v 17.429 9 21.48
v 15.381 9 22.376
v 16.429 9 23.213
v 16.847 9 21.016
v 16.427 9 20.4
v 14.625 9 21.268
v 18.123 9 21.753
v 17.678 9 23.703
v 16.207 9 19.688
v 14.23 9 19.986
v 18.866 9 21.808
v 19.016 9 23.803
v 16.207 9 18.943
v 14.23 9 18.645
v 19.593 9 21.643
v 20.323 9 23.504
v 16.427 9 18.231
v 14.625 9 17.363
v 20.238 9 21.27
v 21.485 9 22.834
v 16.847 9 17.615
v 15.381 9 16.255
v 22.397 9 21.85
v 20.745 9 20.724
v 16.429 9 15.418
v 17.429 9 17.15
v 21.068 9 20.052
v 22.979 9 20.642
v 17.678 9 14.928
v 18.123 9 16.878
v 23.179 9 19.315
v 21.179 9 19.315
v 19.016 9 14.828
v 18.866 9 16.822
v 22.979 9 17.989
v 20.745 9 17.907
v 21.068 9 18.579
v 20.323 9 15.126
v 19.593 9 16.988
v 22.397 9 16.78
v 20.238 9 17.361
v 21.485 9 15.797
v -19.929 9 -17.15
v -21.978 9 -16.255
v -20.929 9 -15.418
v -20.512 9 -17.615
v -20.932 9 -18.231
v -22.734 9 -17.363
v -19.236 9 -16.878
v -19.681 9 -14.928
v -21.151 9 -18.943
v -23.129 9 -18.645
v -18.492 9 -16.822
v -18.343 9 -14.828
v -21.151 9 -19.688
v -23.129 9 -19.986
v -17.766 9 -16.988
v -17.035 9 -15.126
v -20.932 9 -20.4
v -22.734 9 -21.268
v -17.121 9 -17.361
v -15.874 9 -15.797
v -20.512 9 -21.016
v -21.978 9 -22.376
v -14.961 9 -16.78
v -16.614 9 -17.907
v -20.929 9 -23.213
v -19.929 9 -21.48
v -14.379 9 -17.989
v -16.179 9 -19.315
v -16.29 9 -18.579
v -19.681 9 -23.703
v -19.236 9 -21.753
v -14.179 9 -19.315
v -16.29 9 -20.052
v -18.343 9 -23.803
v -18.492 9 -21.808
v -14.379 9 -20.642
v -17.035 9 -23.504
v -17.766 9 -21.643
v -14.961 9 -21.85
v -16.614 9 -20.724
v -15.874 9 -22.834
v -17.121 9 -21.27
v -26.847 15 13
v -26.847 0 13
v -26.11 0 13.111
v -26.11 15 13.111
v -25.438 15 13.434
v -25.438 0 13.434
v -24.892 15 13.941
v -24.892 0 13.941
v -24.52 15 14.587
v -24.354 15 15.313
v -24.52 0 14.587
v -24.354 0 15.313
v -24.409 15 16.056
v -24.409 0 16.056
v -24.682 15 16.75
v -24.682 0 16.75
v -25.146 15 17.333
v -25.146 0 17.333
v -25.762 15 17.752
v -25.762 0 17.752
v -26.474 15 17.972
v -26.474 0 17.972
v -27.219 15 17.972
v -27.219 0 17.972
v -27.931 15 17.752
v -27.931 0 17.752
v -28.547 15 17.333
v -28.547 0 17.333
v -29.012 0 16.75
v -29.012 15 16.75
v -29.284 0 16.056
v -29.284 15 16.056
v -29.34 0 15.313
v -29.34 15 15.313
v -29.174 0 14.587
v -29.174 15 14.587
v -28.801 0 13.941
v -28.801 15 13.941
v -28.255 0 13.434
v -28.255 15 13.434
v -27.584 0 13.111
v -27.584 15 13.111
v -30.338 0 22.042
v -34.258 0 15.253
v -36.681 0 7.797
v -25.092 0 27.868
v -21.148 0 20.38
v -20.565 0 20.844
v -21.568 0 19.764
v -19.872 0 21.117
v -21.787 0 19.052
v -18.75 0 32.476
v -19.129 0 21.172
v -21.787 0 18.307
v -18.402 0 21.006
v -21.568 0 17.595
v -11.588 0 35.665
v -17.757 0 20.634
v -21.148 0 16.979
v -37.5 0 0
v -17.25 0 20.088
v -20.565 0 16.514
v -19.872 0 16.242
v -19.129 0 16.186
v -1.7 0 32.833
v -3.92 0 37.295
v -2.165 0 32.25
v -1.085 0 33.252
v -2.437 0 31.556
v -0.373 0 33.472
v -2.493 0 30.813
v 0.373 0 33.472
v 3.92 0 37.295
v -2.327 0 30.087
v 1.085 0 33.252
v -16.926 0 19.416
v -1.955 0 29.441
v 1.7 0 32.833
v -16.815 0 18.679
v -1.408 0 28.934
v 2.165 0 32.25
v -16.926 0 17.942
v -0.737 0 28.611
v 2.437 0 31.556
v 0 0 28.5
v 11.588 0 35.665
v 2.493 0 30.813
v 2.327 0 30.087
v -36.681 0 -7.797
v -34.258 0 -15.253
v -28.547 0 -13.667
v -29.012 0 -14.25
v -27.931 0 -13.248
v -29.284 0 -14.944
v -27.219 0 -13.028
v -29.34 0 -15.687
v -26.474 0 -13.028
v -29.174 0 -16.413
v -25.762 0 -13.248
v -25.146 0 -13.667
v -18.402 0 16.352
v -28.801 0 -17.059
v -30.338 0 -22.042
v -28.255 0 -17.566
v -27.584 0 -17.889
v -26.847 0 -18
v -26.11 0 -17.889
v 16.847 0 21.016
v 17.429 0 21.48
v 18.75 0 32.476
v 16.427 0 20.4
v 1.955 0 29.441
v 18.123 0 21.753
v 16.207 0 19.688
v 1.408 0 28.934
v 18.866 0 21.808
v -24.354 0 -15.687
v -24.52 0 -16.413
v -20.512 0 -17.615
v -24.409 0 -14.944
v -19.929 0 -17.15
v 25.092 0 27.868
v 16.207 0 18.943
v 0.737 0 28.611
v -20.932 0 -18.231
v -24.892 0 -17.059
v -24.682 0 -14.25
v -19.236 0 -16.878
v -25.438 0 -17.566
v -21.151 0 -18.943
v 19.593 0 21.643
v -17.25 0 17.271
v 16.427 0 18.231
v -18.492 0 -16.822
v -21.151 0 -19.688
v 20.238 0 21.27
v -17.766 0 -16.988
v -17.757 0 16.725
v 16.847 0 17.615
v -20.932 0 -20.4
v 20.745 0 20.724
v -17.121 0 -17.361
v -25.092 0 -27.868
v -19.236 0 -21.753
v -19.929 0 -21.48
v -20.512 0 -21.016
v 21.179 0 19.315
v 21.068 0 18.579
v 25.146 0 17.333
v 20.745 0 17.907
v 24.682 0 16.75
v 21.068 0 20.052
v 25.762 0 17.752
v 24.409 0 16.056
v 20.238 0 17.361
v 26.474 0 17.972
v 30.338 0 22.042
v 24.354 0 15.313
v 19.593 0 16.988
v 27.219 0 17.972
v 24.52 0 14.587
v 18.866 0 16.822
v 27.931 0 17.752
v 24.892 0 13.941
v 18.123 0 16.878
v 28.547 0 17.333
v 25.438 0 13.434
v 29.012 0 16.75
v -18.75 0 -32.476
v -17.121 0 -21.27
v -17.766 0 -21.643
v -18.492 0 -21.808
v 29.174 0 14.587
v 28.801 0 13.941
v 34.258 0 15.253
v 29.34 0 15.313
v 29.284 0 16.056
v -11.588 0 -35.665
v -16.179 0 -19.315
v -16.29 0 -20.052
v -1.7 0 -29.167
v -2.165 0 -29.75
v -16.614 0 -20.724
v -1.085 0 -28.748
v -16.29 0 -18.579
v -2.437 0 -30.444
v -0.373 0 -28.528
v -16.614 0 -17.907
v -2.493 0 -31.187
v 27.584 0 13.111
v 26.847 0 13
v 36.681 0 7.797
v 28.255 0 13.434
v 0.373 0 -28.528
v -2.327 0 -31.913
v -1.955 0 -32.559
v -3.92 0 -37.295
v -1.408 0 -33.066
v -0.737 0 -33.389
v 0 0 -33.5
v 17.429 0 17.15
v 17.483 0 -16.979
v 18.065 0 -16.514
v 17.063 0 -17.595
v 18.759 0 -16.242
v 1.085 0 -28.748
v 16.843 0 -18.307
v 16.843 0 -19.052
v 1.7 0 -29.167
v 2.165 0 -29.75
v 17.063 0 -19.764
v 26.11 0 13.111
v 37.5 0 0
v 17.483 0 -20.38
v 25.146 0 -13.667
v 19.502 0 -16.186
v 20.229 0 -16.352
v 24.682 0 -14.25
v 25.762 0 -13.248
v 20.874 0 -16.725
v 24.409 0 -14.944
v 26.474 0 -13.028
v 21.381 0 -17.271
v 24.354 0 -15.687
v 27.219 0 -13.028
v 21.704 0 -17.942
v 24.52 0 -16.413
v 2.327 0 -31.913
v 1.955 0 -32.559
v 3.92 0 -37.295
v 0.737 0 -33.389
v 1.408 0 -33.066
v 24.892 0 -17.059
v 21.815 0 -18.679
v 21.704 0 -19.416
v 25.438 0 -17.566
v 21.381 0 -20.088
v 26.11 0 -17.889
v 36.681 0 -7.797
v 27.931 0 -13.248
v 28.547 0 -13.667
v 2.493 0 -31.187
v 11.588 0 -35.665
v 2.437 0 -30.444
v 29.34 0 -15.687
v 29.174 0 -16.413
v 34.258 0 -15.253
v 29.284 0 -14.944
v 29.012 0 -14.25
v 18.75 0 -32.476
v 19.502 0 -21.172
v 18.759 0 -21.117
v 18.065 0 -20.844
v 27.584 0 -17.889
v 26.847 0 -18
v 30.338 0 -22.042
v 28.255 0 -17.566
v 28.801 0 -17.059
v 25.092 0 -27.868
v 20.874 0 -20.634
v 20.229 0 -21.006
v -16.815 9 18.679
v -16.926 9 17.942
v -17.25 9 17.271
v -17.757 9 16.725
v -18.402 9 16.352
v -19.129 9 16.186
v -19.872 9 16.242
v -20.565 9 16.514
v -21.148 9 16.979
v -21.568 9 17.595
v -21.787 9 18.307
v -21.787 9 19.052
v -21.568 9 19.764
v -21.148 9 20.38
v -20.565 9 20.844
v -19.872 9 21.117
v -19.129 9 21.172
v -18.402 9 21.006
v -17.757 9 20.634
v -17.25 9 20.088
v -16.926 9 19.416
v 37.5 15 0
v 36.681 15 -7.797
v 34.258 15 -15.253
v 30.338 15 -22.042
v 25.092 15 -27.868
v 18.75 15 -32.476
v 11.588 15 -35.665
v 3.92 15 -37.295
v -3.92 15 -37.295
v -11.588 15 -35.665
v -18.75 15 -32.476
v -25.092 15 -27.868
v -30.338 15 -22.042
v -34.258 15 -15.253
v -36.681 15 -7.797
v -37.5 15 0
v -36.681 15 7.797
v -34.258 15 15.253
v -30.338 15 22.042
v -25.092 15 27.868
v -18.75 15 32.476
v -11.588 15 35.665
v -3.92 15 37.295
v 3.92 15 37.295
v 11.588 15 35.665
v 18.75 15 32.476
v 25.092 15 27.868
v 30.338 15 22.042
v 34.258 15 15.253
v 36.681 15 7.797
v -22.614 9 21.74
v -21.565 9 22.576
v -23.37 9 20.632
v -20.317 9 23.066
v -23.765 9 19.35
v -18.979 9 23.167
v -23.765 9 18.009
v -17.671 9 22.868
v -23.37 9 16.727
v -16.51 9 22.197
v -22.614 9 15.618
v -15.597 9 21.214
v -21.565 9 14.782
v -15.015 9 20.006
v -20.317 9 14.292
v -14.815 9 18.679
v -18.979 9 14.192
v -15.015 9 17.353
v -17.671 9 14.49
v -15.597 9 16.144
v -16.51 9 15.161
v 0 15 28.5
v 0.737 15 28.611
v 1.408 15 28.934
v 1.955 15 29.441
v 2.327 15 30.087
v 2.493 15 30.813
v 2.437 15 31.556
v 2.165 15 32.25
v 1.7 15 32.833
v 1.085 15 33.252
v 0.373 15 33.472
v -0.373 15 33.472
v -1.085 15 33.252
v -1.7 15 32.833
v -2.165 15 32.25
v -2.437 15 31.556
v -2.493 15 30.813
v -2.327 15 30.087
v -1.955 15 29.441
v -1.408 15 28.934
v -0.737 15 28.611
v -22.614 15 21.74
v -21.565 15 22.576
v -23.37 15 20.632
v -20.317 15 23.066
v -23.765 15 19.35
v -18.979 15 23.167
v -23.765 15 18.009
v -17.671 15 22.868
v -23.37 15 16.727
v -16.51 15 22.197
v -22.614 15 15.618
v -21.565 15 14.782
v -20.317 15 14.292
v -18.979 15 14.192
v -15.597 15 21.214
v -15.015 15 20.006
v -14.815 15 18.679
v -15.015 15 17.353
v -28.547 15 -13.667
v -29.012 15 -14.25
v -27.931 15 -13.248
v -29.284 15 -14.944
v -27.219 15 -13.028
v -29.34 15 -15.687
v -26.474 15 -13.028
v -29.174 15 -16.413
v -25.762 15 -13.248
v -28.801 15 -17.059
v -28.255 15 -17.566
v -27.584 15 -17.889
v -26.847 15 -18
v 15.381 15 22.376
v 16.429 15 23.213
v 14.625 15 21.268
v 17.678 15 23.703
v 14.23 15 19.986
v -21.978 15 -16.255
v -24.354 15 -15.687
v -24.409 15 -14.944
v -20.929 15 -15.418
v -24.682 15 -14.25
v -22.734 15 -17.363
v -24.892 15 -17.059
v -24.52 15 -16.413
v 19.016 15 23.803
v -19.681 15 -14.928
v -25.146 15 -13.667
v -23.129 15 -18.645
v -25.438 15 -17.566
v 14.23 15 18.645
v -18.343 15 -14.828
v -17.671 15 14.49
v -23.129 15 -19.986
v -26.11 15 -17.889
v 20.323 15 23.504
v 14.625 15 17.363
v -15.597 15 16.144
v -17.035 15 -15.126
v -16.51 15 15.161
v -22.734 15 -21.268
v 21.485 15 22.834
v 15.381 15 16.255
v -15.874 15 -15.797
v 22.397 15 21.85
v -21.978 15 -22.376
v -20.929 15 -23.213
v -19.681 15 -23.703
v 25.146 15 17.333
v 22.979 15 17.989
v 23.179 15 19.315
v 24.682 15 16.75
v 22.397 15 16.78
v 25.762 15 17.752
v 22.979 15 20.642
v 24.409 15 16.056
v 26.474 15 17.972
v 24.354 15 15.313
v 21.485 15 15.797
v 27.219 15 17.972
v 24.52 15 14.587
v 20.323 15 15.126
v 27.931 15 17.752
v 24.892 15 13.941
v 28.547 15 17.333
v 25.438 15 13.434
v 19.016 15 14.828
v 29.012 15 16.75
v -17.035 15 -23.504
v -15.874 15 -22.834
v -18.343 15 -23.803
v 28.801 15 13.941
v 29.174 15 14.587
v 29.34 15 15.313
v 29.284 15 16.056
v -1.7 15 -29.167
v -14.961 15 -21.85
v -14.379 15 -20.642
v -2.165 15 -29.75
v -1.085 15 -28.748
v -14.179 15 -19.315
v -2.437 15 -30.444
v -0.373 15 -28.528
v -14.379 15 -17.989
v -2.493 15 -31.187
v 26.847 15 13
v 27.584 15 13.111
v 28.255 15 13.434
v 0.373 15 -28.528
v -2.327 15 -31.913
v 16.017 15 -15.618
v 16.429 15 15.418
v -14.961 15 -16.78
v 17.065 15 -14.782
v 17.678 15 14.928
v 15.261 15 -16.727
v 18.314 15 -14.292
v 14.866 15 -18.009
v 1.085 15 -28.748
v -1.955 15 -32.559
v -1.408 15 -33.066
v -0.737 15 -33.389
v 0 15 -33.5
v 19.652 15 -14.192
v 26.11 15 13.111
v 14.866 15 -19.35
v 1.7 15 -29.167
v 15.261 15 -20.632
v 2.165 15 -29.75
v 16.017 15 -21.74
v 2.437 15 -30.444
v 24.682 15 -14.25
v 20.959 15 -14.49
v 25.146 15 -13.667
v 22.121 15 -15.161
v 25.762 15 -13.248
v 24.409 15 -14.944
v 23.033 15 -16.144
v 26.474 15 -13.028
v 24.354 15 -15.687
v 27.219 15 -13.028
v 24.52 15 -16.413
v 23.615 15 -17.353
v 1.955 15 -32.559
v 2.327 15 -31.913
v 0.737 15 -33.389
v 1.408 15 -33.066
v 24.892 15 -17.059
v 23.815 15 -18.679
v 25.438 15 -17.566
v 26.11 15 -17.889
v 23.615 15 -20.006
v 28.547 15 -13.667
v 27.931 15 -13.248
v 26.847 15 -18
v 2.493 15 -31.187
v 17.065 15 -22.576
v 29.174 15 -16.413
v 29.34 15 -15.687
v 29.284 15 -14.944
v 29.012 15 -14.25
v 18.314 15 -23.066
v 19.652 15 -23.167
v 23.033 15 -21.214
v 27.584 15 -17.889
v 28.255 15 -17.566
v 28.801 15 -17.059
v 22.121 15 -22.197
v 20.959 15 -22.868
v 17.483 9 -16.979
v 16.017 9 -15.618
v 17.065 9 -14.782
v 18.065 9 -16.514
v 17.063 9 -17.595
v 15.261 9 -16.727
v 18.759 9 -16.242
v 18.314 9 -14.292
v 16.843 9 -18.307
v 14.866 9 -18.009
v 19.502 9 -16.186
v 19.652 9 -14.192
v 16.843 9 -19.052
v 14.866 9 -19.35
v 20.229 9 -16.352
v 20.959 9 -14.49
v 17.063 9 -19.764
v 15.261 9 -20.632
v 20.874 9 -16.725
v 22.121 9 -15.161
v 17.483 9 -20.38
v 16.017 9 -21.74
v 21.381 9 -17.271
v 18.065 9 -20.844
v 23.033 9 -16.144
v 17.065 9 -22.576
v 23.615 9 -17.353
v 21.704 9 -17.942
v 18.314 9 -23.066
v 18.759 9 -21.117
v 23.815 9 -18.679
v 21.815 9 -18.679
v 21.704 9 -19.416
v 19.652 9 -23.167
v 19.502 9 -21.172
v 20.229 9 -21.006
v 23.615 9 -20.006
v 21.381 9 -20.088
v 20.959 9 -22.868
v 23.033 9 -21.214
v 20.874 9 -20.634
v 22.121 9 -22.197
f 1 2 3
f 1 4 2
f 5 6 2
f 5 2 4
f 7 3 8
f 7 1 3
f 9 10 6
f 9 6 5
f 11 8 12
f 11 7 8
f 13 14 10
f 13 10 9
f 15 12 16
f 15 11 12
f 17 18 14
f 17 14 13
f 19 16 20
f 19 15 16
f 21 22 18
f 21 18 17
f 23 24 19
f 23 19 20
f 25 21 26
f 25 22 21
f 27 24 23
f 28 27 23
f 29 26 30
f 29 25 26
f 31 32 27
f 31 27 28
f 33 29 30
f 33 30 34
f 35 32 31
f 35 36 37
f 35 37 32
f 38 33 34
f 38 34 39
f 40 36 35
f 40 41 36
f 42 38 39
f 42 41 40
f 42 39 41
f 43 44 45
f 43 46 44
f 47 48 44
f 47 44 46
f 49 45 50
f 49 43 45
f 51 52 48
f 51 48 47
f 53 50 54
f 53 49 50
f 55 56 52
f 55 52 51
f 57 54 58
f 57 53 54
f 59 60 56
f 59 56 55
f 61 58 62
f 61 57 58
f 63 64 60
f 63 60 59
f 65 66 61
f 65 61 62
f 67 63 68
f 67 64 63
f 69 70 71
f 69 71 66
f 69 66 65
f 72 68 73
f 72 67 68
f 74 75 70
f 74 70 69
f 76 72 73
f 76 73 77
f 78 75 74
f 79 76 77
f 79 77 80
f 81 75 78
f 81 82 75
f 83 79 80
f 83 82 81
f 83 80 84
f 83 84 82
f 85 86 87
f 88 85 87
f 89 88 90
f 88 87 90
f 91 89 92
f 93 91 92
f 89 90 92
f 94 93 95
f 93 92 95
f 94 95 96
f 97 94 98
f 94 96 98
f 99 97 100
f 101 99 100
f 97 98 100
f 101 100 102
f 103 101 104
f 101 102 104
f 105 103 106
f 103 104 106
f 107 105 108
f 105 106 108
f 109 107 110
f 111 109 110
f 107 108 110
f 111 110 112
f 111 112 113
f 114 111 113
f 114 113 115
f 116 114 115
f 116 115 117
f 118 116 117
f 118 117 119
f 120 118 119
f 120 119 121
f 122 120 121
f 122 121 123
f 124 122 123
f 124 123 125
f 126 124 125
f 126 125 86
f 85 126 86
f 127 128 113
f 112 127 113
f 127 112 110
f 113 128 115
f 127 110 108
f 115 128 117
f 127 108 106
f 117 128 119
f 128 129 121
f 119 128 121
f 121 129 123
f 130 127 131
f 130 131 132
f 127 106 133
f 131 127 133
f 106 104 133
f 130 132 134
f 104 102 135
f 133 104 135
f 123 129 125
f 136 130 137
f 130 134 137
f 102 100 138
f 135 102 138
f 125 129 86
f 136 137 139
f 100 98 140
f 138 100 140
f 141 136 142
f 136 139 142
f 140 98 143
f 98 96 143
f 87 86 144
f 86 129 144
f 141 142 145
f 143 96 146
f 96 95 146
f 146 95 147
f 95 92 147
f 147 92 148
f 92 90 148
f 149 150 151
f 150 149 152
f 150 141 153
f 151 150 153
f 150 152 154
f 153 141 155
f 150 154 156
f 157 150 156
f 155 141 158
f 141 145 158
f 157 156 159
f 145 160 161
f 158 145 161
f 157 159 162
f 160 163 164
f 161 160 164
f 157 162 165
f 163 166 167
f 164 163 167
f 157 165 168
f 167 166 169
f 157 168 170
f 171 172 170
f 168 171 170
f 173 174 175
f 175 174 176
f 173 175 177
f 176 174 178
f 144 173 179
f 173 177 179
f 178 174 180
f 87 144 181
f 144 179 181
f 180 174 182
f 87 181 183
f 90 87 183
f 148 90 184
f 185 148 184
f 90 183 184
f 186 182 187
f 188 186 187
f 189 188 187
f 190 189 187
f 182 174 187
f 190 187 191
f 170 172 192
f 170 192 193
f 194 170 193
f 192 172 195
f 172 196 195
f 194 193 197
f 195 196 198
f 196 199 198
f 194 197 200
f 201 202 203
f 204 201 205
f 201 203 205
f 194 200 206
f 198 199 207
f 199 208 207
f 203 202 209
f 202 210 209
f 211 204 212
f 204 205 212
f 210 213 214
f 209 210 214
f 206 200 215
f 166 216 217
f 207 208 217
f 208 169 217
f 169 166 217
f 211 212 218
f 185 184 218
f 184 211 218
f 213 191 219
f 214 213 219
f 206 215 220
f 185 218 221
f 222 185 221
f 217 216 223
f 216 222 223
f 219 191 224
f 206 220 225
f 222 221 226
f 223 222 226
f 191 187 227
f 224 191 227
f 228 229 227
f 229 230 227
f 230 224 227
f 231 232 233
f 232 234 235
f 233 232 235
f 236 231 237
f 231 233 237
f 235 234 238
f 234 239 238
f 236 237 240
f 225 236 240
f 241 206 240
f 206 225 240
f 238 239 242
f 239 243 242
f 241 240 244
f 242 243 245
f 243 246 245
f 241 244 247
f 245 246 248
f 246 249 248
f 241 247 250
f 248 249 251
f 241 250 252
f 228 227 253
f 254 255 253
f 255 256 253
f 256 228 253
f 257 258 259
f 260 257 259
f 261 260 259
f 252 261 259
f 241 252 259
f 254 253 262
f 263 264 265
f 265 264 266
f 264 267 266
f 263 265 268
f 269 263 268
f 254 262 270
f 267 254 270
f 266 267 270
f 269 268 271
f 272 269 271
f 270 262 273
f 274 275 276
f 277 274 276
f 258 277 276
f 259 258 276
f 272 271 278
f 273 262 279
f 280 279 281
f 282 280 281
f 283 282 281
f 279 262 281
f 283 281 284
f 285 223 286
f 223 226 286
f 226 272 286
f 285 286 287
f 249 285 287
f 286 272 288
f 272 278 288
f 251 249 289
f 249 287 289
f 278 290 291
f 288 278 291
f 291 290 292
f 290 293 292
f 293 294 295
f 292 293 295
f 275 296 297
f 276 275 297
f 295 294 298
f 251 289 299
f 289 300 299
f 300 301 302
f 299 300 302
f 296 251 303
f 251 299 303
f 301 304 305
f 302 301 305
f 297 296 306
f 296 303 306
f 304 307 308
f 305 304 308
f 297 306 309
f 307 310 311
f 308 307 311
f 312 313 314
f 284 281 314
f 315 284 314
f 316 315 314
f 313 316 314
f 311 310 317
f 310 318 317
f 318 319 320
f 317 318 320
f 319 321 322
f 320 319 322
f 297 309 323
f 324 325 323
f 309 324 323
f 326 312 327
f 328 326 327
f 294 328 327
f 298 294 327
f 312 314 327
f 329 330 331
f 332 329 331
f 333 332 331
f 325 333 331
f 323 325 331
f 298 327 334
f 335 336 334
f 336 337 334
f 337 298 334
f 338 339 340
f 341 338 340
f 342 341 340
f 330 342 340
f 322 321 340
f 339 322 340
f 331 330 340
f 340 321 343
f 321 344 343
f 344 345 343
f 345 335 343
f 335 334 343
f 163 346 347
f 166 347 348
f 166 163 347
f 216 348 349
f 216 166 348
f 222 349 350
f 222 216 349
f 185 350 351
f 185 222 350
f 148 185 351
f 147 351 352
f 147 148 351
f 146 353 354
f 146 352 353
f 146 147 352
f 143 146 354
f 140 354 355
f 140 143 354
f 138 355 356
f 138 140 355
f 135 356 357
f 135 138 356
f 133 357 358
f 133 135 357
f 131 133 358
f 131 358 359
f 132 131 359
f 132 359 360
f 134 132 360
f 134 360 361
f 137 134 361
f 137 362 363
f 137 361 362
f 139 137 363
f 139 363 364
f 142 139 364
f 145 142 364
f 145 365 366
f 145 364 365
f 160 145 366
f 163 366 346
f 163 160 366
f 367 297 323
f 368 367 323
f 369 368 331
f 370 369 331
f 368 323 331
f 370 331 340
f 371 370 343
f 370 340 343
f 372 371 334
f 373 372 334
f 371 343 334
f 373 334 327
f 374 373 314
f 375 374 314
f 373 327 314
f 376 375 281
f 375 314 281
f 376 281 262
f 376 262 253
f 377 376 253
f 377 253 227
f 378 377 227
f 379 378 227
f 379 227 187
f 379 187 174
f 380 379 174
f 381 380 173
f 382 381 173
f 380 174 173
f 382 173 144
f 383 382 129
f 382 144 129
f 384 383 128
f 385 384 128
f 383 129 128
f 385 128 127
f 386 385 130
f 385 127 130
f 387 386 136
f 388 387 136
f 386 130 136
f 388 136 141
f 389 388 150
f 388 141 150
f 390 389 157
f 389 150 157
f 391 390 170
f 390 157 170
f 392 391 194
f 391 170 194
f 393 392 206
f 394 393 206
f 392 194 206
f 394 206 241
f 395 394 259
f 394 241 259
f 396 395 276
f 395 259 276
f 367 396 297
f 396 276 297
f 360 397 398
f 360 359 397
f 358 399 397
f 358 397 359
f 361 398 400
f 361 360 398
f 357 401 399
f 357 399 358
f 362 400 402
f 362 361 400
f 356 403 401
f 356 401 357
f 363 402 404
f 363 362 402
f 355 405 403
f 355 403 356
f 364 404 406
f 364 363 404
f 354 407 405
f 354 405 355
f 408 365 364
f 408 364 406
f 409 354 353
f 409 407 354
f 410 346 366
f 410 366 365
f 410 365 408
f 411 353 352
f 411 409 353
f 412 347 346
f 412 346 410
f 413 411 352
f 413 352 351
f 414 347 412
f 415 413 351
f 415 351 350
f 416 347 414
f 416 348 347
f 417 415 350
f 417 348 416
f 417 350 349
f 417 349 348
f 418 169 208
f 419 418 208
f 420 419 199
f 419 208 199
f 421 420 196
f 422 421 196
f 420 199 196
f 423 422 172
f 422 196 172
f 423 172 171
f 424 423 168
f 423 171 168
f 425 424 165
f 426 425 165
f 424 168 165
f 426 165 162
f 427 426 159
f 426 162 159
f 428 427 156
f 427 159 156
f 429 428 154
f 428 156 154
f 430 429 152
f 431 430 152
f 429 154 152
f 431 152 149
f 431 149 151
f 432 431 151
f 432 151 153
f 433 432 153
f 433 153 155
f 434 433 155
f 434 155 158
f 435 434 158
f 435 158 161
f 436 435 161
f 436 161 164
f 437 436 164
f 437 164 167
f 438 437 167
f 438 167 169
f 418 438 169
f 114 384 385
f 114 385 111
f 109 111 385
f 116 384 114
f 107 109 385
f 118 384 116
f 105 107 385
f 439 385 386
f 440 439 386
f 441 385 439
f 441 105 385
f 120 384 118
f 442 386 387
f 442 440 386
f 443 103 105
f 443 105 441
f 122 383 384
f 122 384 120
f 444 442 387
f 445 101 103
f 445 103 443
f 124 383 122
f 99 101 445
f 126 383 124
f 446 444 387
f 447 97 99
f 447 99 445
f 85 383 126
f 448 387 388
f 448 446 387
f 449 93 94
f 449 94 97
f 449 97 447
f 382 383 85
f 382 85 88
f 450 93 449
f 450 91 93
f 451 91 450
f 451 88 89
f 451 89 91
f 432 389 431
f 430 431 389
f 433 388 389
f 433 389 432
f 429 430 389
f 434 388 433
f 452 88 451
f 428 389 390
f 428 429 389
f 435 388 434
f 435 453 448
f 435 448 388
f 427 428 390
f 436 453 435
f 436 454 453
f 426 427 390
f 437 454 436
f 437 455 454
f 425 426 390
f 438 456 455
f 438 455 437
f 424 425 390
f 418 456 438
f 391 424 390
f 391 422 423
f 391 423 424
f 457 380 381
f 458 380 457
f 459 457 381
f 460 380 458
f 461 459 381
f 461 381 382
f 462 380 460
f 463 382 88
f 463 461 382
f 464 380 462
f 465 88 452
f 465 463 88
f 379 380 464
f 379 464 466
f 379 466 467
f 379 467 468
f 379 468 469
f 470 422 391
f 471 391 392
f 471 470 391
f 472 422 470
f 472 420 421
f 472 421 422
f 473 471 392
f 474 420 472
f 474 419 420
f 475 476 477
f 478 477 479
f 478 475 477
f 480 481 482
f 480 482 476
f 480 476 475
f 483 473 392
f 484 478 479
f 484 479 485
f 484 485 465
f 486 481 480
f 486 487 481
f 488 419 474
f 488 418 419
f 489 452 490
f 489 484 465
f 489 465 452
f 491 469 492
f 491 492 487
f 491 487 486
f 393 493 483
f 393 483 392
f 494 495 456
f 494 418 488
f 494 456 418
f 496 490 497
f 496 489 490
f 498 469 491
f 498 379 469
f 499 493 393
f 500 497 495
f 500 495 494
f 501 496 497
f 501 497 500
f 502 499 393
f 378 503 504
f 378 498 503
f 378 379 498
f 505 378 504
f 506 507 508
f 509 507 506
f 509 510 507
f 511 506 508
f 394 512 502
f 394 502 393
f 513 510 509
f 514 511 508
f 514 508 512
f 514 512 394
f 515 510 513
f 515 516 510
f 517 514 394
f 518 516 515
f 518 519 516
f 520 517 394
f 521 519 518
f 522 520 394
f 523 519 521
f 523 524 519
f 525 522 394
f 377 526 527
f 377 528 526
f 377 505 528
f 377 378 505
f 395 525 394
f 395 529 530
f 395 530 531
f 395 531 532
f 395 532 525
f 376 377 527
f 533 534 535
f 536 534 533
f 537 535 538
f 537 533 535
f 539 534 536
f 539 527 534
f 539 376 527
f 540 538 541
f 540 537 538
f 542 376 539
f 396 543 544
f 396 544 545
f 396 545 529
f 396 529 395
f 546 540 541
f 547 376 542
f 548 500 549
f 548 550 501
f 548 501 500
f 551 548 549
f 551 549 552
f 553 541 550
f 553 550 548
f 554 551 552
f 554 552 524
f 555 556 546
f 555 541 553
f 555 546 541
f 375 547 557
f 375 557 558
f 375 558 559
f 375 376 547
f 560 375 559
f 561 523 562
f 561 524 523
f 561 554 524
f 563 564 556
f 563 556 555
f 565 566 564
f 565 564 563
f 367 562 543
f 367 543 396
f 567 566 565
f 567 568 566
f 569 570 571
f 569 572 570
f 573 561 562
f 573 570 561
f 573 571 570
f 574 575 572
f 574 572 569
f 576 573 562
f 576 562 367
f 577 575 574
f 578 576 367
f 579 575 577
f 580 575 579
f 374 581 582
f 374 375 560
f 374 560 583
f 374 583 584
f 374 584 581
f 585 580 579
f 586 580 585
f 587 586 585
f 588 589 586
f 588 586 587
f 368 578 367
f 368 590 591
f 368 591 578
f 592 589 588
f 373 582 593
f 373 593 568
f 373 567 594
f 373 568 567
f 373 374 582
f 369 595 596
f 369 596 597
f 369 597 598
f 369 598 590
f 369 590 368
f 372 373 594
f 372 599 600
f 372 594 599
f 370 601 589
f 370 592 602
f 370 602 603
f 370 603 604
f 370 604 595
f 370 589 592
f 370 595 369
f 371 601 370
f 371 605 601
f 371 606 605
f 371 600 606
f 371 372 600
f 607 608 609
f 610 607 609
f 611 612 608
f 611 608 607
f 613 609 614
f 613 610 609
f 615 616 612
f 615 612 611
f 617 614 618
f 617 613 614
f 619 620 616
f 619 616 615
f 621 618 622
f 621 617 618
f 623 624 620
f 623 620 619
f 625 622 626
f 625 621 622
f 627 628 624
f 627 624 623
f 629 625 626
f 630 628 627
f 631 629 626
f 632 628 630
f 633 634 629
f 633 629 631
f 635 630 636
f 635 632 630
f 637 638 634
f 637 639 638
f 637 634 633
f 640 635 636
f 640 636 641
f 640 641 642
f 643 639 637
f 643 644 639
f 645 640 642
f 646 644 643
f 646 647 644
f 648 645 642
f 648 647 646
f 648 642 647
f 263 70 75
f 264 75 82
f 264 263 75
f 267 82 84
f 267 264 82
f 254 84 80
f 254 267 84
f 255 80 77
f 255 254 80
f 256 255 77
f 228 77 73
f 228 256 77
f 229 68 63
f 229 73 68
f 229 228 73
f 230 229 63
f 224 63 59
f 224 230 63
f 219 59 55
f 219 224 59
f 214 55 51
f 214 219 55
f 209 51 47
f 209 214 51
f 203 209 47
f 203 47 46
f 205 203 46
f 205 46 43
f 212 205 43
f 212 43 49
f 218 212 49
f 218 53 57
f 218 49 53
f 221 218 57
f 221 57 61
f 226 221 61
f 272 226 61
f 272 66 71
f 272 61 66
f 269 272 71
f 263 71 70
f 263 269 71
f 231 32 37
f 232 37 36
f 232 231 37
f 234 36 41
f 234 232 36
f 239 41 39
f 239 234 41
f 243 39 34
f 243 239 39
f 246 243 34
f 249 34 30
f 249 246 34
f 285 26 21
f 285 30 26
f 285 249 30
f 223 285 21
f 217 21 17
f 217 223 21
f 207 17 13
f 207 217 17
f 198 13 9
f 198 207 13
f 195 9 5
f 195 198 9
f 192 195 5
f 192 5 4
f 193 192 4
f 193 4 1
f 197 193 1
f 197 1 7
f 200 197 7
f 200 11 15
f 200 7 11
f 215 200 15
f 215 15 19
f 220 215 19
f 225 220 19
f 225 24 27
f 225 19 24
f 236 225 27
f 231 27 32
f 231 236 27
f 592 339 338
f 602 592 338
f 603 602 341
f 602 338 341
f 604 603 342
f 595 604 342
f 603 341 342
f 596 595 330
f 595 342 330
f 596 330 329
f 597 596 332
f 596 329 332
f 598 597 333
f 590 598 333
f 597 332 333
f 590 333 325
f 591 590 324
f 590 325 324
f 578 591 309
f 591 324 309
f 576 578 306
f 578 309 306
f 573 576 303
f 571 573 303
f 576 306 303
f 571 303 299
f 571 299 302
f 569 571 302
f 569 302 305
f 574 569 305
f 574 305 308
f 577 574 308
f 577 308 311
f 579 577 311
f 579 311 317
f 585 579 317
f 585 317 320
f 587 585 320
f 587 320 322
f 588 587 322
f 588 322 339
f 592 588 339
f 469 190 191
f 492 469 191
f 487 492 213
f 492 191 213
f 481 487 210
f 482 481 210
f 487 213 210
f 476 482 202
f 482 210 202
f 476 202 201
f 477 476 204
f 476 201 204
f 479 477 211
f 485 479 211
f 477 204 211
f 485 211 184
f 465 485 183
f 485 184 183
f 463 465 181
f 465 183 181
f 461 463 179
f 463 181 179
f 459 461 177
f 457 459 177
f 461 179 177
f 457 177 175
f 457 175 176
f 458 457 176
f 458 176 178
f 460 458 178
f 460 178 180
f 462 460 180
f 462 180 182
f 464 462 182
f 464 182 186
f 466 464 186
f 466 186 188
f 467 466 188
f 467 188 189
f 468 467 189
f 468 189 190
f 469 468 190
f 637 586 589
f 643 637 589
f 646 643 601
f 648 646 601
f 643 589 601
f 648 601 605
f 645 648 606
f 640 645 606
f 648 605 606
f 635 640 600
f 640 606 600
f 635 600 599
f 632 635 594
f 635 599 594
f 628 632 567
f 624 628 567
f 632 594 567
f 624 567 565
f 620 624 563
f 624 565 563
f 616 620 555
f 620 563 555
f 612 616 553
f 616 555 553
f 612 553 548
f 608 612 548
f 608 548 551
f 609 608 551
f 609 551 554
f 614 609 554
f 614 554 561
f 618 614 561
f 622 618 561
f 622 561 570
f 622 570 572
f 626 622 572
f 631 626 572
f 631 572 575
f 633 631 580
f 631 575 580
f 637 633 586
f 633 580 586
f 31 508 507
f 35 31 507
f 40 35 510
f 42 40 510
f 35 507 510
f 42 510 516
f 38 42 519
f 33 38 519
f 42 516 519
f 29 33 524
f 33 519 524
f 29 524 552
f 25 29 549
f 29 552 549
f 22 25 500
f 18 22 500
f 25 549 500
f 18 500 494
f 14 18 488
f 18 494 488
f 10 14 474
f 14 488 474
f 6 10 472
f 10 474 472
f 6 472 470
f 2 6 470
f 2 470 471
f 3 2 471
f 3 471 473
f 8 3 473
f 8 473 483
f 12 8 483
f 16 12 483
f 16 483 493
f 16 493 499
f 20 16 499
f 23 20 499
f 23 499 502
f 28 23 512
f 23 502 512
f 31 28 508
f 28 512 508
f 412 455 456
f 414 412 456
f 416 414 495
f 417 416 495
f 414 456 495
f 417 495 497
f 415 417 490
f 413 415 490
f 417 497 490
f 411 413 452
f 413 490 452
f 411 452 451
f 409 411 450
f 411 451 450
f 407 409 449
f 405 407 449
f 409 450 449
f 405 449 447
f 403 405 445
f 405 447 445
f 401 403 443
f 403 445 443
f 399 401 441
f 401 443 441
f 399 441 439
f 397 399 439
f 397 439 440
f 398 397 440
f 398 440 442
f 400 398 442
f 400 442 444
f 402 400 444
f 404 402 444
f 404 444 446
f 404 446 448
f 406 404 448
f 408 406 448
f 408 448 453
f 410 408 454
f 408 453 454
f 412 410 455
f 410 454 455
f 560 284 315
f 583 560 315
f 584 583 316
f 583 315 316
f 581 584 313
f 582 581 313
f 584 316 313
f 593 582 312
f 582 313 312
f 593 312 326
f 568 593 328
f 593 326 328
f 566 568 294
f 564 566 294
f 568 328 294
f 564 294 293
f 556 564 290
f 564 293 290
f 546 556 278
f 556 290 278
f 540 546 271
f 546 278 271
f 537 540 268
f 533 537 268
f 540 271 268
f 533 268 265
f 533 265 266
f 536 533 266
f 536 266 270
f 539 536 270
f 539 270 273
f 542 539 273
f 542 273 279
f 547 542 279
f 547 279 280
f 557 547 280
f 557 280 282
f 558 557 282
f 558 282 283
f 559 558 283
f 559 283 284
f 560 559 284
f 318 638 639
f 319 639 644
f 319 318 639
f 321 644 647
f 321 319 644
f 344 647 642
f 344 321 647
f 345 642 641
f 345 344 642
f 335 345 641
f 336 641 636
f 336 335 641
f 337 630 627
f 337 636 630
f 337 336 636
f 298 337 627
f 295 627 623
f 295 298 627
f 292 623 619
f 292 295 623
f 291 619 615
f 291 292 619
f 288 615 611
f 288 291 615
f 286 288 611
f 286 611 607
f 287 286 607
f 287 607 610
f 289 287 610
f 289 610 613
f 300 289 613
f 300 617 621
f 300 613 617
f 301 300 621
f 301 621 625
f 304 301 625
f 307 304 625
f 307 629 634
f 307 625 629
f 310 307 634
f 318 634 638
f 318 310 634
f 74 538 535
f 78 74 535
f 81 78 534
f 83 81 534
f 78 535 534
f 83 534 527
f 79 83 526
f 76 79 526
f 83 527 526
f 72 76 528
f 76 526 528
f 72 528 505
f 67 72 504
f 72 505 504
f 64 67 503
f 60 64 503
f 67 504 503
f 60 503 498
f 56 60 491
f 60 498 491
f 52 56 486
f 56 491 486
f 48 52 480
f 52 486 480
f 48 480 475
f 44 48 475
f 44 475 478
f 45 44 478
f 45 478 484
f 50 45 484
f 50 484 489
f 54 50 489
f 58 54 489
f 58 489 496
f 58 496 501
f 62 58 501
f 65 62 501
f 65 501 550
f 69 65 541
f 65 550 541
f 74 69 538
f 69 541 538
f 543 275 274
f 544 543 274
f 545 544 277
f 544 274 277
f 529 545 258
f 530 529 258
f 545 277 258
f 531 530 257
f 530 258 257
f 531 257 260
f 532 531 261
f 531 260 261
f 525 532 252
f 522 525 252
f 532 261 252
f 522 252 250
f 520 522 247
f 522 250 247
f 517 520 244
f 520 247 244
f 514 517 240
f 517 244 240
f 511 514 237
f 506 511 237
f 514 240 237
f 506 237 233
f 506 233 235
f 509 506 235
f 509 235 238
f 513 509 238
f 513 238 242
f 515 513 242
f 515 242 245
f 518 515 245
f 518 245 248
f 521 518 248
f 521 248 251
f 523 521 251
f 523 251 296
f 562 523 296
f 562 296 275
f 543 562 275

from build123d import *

# Parameters (mm, degrees)
SKETCH2_R             = 37.5
SKETCH2_R_2           = 2.5
BOSS_EXTRUDE1_DEPTH   = 15
SKETCH3_R             = 4.5
CUT_EXTRUDE1_DEPTH    = 6
M6X1_0_TAPPED_HOLE1_D = 5


with BuildPart() as part:
    # Sketch2 → Boss-Extrude1 (new body)
    with BuildSketch(Plane(origin=(0, 0, 0), x_dir=(1, 0, 0), z_dir=(0, 1, 0))):
        Circle(SKETCH2_R)
        with Locations((-18.679244128, 19.315419379)):
            Circle(SKETCH2_R_2, mode=Mode.SUBTRACT)
        with Locations((19.315419379, 18.679244128)):
            Circle(SKETCH2_R_2, mode=Mode.SUBTRACT)
        with Locations((18.679244128, -19.315419379)):
            Circle(SKETCH2_R_2, mode=Mode.SUBTRACT)
        with Locations((-19.315419379, -18.679244128)):
            Circle(SKETCH2_R_2, mode=Mode.SUBTRACT)
    extrude(amount=BOSS_EXTRUDE1_DEPTH)

    # Sketch3 → Cut-Extrude1 (cut)
    with BuildSketch(Plane(origin=(0, 15, 0), x_dir=(1, 0, 0), z_dir=(0, 1, 0))):
        with Locations((-18.679244128, 19.315419379)):
            Circle(SKETCH3_R)
        with Locations((19.315419379, 18.679244128)):
            Circle(SKETCH3_R)
        with Locations((18.679244128, -19.315419379)):
            Circle(SKETCH3_R)
        with Locations((-19.315419379, -18.679244128)):
            Circle(SKETCH3_R)
    extrude(amount=-CUT_EXTRUDE1_DEPTH, mode=Mode.SUBTRACT)

    # M6x1.0 Tapped Hole1 (through all)
    with Locations(Plane(origin=(0, 15, -31), x_dir=(0, 0, 1), z_dir=(0, 1, 0))):
        with Locations((0, 0), (15.5, 26.846787517), (46.5, 26.846787517), (62, 0), (46.5, -26.846787517), (15.5, -26.846787517)):
            Hole(M6X1_0_TAPPED_HOLE1_D / 2)


solid = part.part
